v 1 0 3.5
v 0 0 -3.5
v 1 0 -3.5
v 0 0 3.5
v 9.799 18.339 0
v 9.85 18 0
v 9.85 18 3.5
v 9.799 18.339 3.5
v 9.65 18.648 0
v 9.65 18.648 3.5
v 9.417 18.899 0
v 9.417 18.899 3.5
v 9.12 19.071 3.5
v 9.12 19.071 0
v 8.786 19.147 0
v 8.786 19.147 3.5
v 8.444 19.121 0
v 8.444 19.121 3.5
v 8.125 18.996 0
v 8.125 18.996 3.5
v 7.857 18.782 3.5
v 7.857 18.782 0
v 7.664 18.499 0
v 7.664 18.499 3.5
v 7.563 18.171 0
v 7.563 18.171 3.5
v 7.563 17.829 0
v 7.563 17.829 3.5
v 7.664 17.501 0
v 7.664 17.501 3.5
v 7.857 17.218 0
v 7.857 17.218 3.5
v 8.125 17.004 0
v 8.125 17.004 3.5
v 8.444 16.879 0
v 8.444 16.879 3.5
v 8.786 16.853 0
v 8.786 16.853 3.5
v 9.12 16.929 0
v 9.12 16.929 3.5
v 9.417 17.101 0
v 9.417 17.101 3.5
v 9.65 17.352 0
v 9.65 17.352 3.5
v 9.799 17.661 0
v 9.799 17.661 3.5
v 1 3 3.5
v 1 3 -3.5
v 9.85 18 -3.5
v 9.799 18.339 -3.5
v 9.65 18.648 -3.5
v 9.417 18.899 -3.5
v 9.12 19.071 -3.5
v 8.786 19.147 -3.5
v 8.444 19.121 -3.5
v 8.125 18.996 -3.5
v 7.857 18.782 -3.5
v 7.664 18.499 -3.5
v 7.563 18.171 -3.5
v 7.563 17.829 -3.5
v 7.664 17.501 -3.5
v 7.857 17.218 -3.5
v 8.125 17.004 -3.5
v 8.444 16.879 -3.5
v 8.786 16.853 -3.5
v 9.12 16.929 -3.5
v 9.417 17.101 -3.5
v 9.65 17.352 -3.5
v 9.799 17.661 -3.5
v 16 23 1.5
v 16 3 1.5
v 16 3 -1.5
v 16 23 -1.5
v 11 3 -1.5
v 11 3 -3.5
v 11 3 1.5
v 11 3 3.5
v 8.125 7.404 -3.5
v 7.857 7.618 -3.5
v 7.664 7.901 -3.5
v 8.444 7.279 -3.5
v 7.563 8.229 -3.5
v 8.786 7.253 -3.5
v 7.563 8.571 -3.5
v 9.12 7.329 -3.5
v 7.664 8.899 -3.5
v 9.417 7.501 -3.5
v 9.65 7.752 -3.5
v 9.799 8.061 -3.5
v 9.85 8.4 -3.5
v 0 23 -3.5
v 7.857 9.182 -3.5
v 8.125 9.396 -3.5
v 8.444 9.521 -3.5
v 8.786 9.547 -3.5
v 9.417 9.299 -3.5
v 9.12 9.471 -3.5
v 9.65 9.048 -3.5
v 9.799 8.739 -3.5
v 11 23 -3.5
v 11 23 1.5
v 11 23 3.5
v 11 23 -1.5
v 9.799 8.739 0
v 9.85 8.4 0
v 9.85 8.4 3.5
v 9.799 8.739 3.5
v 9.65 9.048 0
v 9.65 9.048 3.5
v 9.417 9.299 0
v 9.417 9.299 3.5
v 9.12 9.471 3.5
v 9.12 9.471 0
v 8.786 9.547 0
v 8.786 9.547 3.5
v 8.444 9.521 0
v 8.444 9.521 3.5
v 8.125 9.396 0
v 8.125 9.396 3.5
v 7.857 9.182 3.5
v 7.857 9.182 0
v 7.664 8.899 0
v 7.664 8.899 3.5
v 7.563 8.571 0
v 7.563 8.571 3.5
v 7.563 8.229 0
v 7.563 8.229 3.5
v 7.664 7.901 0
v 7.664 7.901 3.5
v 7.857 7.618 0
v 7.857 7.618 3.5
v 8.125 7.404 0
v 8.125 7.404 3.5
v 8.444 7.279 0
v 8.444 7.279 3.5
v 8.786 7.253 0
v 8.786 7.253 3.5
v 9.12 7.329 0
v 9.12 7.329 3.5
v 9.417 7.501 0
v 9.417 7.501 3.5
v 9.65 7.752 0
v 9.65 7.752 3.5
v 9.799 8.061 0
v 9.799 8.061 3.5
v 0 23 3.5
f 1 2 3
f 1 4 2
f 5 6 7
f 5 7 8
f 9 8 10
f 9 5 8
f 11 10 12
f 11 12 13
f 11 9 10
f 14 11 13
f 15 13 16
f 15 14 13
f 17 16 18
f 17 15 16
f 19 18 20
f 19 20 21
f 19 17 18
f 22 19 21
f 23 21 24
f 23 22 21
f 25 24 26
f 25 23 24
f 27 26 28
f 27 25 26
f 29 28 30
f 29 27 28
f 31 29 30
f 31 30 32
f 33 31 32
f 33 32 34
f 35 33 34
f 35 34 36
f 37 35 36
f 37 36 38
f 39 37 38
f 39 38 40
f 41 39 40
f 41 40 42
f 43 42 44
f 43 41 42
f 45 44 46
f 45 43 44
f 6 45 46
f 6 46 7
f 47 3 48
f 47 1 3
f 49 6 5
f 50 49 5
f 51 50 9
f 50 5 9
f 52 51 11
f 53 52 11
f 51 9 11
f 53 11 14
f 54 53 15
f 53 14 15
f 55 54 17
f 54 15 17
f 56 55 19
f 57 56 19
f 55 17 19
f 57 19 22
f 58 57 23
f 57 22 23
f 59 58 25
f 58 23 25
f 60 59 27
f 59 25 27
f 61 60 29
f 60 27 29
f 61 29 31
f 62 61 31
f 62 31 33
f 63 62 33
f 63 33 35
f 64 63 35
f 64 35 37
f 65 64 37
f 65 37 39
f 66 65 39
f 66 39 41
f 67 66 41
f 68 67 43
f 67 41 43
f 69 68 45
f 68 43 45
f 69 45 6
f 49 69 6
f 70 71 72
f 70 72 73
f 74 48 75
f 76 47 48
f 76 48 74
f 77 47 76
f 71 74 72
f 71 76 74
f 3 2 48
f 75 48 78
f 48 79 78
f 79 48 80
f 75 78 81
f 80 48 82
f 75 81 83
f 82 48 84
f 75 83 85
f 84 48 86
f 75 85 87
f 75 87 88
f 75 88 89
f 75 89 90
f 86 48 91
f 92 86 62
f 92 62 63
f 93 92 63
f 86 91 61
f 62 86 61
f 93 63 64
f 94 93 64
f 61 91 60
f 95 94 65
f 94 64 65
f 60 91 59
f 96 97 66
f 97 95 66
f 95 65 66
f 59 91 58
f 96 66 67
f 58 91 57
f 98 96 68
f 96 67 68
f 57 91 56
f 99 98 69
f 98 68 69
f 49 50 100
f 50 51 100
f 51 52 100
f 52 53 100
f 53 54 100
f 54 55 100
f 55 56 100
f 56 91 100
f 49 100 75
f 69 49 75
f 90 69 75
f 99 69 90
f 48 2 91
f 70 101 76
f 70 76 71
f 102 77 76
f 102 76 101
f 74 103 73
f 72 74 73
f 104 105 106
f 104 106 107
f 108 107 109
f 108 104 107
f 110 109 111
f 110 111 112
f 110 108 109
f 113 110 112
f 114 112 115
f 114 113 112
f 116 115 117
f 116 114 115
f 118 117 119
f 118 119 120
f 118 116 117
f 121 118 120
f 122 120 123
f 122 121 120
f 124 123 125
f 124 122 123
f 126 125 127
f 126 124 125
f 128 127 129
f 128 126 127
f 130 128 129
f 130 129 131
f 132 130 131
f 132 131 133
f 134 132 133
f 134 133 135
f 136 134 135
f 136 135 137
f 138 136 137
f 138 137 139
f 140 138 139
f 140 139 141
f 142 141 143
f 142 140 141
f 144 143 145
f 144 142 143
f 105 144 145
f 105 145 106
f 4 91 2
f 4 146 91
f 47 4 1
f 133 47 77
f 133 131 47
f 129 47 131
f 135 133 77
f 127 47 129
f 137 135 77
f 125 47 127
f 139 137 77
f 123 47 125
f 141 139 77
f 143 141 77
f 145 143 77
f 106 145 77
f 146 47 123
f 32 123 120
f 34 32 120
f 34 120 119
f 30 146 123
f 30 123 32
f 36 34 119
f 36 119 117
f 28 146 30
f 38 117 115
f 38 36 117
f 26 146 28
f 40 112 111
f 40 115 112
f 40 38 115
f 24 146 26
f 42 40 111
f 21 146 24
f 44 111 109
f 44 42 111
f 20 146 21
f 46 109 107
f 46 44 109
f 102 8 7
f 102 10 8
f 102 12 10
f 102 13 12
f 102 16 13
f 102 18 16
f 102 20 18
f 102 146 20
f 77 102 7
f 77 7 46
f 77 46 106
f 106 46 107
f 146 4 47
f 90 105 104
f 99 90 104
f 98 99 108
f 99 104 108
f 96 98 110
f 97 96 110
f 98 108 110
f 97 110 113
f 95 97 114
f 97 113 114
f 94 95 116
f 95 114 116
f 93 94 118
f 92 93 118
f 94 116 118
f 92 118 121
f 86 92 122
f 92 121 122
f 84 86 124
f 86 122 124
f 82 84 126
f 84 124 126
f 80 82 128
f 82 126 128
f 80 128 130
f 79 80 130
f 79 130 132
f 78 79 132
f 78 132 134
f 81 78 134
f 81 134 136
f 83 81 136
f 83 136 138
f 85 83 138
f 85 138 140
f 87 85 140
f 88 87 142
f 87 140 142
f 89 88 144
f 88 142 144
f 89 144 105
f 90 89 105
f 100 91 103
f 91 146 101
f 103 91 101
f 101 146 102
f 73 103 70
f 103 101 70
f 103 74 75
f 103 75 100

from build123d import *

# Parameters (mm, degrees)
BOSS_EXTRUDE1_DEPTH      = 3.5
BOSS_EXTRUDE1_DEPTH_BACK = 3.5
SKETCH1_R                = 1.15
BOSS_EXTRUDE2_DEPTH      = 1.5
BOSS_EXTRUDE2_DEPTH_BACK = 1.5
SKETCH1_3_W              = 5
SKETCH1_3_H              = 20


with BuildPart() as part:
    # Sketch1 → Boss-Extrude1 (new, two sides: drawn at the far end of the back side and taken through both)
    with BuildSketch(Plane.XY.offset(-BOSS_EXTRUDE1_DEPTH_BACK)):
        Polygon((1, 0), (1, 3), (11, 3), (11, 23), (0, 23), (0, 0), align=None)
        with Locations((8.7, 8.4)):
            Circle(SKETCH1_R, mode=Mode.SUBTRACT)
        with Locations((8.7, 18)):
            Circle(SKETCH1_R, mode=Mode.SUBTRACT)
    extrude(amount=BOSS_EXTRUDE1_DEPTH + BOSS_EXTRUDE1_DEPTH_BACK)

    # Sketch1<3> → Boss-Extrude2 (add, two sides: drawn at the far end of the back side and taken through both)
    with BuildSketch(Plane.XY.offset(-BOSS_EXTRUDE2_DEPTH_BACK)):
        with Locations((13.5, 13)):
            Rectangle(SKETCH1_3_W, SKETCH1_3_H)
    extrude(amount=BOSS_EXTRUDE2_DEPTH + BOSS_EXTRUDE2_DEPTH_BACK)


solid = part.part
